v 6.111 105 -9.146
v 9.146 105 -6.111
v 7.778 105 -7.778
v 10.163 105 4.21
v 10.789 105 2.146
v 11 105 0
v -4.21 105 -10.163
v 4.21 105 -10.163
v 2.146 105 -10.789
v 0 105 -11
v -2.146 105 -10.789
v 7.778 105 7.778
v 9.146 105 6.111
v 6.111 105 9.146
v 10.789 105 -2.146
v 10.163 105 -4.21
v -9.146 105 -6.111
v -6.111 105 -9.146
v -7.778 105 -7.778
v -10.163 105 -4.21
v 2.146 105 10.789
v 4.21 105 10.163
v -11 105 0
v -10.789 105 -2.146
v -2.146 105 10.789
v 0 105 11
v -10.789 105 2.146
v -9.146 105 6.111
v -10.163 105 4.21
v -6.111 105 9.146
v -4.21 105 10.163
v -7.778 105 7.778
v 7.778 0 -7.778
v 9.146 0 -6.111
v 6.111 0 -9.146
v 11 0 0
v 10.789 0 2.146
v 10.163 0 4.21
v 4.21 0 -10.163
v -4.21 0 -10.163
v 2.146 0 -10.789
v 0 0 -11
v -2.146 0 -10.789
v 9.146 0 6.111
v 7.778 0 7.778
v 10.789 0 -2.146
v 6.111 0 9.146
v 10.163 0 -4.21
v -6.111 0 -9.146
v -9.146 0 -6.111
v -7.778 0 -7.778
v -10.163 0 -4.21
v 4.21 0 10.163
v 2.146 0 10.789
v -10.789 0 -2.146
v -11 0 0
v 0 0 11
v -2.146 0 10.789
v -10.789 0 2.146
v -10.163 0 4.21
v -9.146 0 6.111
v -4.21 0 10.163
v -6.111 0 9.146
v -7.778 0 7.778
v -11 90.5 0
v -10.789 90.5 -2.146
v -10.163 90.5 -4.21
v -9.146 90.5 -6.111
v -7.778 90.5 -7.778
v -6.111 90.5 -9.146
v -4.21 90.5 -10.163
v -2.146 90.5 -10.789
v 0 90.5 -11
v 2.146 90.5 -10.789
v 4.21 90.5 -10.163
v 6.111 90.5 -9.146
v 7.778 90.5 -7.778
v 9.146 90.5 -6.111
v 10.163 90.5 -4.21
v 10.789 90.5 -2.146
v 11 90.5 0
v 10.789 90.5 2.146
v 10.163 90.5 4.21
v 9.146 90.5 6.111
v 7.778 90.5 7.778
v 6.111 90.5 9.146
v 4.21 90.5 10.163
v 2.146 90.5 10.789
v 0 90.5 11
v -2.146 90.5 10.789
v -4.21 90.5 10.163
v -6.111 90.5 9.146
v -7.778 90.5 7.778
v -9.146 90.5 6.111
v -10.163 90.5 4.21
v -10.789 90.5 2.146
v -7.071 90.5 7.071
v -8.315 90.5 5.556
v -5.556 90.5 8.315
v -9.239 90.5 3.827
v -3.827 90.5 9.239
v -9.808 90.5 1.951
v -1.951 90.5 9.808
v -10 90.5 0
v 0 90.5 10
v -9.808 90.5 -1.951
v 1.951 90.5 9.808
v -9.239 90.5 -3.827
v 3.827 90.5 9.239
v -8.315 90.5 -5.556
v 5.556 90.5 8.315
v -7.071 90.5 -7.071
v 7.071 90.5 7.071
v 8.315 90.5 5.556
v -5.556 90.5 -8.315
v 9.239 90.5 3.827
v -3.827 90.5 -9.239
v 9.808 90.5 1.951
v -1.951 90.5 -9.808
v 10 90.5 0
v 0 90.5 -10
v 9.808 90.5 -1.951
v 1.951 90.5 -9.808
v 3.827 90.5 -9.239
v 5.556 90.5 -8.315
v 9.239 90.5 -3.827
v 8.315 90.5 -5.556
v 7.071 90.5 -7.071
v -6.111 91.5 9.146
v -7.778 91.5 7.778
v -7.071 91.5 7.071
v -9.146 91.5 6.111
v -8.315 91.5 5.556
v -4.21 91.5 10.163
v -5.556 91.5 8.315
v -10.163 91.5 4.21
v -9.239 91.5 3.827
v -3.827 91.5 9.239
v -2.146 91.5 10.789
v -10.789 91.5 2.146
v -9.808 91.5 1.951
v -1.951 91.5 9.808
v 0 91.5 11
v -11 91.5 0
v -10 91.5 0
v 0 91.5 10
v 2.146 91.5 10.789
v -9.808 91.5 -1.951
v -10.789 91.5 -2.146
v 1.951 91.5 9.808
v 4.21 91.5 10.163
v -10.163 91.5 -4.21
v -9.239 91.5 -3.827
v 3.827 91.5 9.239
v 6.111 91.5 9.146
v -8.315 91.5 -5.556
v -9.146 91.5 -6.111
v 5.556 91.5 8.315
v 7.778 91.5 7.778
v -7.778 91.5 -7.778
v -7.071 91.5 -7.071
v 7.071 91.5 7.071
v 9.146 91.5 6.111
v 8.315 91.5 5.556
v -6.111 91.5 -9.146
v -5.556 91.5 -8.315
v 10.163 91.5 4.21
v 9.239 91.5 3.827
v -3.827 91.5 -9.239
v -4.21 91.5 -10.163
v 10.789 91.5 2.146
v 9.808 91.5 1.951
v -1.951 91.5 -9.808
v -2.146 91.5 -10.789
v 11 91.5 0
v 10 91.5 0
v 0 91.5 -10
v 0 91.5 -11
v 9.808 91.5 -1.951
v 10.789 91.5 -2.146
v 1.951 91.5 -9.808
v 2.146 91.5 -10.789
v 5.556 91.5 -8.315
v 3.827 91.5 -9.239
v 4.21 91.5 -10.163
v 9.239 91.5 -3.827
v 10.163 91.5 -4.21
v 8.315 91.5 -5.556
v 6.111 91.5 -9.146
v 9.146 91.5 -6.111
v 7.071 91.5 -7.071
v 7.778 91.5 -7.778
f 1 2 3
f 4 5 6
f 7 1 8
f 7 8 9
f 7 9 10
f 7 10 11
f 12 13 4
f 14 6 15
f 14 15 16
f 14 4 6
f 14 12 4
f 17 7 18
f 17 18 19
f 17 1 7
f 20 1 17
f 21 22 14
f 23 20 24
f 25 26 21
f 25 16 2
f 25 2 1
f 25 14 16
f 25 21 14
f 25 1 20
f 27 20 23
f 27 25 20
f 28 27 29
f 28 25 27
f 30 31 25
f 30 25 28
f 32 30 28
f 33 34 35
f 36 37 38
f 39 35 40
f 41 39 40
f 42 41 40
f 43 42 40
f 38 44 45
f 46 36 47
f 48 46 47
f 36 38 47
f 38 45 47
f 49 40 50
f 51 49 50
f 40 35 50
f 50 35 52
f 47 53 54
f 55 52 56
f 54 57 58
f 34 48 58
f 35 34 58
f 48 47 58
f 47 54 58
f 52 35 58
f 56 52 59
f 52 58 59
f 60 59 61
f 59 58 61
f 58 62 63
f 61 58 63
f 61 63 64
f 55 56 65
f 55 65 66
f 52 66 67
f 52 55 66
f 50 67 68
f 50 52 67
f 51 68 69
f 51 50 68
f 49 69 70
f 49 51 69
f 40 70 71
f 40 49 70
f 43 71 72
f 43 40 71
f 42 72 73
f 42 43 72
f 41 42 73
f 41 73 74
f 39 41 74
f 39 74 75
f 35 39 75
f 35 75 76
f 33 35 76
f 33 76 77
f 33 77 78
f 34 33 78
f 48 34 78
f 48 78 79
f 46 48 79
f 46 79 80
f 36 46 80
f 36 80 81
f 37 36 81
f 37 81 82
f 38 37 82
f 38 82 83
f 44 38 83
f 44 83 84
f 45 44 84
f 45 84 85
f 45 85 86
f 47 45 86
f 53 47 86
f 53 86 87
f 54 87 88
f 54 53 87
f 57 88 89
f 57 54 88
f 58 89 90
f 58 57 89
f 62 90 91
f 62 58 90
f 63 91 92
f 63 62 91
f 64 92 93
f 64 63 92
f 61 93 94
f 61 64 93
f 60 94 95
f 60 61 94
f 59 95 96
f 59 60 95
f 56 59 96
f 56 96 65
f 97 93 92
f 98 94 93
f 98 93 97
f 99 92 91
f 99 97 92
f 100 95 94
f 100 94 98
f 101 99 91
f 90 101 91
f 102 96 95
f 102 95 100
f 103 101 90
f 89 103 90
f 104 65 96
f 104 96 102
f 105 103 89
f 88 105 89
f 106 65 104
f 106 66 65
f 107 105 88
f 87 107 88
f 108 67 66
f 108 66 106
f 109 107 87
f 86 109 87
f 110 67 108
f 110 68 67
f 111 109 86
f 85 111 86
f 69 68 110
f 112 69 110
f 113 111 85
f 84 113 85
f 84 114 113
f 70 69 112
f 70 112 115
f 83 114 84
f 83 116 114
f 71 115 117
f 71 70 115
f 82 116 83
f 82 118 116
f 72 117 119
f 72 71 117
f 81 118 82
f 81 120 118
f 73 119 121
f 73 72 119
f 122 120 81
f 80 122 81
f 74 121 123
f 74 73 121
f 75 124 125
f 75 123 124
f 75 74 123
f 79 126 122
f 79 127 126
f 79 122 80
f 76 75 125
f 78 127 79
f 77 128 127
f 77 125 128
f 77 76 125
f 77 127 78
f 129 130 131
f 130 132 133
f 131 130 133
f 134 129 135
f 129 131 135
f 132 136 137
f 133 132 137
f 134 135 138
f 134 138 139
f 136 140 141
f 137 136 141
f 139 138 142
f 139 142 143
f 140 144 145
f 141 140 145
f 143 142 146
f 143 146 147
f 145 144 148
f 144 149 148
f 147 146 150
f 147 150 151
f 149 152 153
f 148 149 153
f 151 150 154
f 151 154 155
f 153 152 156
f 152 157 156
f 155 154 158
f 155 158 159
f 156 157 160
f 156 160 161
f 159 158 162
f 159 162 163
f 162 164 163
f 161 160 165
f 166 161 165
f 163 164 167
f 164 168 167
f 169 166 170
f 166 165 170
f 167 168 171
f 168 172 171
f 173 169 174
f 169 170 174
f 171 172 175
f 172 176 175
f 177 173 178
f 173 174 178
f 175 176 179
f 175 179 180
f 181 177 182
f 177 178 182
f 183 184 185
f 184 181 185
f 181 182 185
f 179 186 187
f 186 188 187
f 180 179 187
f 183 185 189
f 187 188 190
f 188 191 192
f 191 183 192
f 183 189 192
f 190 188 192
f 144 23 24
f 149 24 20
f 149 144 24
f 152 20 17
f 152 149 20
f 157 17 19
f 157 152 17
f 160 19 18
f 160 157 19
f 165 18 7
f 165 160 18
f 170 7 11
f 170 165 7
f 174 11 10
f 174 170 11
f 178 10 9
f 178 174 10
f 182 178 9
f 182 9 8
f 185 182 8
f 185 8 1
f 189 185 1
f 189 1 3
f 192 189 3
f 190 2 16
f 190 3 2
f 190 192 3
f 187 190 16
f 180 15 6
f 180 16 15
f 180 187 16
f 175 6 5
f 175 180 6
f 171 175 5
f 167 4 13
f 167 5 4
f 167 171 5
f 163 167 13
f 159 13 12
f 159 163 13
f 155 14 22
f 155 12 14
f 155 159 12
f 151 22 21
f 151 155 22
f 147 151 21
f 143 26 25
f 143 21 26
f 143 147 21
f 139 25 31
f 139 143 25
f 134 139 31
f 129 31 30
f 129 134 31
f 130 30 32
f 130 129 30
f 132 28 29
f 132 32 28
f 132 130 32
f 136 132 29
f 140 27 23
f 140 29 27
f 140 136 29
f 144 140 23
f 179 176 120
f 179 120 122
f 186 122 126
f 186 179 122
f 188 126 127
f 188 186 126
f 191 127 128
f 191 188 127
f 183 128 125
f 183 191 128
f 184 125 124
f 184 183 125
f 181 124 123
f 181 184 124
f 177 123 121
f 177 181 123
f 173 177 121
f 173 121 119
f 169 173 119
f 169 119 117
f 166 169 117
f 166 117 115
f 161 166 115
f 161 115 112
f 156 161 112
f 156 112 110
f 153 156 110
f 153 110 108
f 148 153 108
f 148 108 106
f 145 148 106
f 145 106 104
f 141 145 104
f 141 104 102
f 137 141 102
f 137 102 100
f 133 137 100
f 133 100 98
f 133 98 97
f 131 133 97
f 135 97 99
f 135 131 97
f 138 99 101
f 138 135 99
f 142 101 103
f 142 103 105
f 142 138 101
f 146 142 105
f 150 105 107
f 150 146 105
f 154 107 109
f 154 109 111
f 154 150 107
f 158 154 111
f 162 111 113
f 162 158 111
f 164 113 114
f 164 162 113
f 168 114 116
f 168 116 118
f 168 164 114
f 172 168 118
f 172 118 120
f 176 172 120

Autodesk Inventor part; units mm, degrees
ref_plane "YZ Plane" through (0, 0, 0) normal (1, 0, 0) x (0, 1, 0)
ref_plane "XZ Plane" through (0, 0, 0) normal (0, 1, 0) x (-1, 0, 0)
sketch "Boceto1" plane through (0, 0, 0) normal (0, 1, 0) x (-1, 0, 0)
  circle A0 centre (0, 0) radius 11
  dimension "d0" = 22
extrude "Extrusión1" add sketch "Boceto1" along normal blind 105
ref_plane "Plano de trabajo1" through (0, 91.5, 0) normal (0, 1, 0) x (1, 0, 0)
sketch "Boceto2" plane through (0, 91.5, 0) normal (0, 1, 0) x (1, 0, 0)
  circle A0 centre (0, 0) radius 11
  circle A1 centre (0, 0) radius 10
  dimension "d4" = 20
extrude "Extrusión2" cut sketch "Boceto2" against normal blind 1
thread "Rosca1" size "M22x1.5" class "6g" standard "ANSI Metric M Profile" full length
properties part number "W520superior"
